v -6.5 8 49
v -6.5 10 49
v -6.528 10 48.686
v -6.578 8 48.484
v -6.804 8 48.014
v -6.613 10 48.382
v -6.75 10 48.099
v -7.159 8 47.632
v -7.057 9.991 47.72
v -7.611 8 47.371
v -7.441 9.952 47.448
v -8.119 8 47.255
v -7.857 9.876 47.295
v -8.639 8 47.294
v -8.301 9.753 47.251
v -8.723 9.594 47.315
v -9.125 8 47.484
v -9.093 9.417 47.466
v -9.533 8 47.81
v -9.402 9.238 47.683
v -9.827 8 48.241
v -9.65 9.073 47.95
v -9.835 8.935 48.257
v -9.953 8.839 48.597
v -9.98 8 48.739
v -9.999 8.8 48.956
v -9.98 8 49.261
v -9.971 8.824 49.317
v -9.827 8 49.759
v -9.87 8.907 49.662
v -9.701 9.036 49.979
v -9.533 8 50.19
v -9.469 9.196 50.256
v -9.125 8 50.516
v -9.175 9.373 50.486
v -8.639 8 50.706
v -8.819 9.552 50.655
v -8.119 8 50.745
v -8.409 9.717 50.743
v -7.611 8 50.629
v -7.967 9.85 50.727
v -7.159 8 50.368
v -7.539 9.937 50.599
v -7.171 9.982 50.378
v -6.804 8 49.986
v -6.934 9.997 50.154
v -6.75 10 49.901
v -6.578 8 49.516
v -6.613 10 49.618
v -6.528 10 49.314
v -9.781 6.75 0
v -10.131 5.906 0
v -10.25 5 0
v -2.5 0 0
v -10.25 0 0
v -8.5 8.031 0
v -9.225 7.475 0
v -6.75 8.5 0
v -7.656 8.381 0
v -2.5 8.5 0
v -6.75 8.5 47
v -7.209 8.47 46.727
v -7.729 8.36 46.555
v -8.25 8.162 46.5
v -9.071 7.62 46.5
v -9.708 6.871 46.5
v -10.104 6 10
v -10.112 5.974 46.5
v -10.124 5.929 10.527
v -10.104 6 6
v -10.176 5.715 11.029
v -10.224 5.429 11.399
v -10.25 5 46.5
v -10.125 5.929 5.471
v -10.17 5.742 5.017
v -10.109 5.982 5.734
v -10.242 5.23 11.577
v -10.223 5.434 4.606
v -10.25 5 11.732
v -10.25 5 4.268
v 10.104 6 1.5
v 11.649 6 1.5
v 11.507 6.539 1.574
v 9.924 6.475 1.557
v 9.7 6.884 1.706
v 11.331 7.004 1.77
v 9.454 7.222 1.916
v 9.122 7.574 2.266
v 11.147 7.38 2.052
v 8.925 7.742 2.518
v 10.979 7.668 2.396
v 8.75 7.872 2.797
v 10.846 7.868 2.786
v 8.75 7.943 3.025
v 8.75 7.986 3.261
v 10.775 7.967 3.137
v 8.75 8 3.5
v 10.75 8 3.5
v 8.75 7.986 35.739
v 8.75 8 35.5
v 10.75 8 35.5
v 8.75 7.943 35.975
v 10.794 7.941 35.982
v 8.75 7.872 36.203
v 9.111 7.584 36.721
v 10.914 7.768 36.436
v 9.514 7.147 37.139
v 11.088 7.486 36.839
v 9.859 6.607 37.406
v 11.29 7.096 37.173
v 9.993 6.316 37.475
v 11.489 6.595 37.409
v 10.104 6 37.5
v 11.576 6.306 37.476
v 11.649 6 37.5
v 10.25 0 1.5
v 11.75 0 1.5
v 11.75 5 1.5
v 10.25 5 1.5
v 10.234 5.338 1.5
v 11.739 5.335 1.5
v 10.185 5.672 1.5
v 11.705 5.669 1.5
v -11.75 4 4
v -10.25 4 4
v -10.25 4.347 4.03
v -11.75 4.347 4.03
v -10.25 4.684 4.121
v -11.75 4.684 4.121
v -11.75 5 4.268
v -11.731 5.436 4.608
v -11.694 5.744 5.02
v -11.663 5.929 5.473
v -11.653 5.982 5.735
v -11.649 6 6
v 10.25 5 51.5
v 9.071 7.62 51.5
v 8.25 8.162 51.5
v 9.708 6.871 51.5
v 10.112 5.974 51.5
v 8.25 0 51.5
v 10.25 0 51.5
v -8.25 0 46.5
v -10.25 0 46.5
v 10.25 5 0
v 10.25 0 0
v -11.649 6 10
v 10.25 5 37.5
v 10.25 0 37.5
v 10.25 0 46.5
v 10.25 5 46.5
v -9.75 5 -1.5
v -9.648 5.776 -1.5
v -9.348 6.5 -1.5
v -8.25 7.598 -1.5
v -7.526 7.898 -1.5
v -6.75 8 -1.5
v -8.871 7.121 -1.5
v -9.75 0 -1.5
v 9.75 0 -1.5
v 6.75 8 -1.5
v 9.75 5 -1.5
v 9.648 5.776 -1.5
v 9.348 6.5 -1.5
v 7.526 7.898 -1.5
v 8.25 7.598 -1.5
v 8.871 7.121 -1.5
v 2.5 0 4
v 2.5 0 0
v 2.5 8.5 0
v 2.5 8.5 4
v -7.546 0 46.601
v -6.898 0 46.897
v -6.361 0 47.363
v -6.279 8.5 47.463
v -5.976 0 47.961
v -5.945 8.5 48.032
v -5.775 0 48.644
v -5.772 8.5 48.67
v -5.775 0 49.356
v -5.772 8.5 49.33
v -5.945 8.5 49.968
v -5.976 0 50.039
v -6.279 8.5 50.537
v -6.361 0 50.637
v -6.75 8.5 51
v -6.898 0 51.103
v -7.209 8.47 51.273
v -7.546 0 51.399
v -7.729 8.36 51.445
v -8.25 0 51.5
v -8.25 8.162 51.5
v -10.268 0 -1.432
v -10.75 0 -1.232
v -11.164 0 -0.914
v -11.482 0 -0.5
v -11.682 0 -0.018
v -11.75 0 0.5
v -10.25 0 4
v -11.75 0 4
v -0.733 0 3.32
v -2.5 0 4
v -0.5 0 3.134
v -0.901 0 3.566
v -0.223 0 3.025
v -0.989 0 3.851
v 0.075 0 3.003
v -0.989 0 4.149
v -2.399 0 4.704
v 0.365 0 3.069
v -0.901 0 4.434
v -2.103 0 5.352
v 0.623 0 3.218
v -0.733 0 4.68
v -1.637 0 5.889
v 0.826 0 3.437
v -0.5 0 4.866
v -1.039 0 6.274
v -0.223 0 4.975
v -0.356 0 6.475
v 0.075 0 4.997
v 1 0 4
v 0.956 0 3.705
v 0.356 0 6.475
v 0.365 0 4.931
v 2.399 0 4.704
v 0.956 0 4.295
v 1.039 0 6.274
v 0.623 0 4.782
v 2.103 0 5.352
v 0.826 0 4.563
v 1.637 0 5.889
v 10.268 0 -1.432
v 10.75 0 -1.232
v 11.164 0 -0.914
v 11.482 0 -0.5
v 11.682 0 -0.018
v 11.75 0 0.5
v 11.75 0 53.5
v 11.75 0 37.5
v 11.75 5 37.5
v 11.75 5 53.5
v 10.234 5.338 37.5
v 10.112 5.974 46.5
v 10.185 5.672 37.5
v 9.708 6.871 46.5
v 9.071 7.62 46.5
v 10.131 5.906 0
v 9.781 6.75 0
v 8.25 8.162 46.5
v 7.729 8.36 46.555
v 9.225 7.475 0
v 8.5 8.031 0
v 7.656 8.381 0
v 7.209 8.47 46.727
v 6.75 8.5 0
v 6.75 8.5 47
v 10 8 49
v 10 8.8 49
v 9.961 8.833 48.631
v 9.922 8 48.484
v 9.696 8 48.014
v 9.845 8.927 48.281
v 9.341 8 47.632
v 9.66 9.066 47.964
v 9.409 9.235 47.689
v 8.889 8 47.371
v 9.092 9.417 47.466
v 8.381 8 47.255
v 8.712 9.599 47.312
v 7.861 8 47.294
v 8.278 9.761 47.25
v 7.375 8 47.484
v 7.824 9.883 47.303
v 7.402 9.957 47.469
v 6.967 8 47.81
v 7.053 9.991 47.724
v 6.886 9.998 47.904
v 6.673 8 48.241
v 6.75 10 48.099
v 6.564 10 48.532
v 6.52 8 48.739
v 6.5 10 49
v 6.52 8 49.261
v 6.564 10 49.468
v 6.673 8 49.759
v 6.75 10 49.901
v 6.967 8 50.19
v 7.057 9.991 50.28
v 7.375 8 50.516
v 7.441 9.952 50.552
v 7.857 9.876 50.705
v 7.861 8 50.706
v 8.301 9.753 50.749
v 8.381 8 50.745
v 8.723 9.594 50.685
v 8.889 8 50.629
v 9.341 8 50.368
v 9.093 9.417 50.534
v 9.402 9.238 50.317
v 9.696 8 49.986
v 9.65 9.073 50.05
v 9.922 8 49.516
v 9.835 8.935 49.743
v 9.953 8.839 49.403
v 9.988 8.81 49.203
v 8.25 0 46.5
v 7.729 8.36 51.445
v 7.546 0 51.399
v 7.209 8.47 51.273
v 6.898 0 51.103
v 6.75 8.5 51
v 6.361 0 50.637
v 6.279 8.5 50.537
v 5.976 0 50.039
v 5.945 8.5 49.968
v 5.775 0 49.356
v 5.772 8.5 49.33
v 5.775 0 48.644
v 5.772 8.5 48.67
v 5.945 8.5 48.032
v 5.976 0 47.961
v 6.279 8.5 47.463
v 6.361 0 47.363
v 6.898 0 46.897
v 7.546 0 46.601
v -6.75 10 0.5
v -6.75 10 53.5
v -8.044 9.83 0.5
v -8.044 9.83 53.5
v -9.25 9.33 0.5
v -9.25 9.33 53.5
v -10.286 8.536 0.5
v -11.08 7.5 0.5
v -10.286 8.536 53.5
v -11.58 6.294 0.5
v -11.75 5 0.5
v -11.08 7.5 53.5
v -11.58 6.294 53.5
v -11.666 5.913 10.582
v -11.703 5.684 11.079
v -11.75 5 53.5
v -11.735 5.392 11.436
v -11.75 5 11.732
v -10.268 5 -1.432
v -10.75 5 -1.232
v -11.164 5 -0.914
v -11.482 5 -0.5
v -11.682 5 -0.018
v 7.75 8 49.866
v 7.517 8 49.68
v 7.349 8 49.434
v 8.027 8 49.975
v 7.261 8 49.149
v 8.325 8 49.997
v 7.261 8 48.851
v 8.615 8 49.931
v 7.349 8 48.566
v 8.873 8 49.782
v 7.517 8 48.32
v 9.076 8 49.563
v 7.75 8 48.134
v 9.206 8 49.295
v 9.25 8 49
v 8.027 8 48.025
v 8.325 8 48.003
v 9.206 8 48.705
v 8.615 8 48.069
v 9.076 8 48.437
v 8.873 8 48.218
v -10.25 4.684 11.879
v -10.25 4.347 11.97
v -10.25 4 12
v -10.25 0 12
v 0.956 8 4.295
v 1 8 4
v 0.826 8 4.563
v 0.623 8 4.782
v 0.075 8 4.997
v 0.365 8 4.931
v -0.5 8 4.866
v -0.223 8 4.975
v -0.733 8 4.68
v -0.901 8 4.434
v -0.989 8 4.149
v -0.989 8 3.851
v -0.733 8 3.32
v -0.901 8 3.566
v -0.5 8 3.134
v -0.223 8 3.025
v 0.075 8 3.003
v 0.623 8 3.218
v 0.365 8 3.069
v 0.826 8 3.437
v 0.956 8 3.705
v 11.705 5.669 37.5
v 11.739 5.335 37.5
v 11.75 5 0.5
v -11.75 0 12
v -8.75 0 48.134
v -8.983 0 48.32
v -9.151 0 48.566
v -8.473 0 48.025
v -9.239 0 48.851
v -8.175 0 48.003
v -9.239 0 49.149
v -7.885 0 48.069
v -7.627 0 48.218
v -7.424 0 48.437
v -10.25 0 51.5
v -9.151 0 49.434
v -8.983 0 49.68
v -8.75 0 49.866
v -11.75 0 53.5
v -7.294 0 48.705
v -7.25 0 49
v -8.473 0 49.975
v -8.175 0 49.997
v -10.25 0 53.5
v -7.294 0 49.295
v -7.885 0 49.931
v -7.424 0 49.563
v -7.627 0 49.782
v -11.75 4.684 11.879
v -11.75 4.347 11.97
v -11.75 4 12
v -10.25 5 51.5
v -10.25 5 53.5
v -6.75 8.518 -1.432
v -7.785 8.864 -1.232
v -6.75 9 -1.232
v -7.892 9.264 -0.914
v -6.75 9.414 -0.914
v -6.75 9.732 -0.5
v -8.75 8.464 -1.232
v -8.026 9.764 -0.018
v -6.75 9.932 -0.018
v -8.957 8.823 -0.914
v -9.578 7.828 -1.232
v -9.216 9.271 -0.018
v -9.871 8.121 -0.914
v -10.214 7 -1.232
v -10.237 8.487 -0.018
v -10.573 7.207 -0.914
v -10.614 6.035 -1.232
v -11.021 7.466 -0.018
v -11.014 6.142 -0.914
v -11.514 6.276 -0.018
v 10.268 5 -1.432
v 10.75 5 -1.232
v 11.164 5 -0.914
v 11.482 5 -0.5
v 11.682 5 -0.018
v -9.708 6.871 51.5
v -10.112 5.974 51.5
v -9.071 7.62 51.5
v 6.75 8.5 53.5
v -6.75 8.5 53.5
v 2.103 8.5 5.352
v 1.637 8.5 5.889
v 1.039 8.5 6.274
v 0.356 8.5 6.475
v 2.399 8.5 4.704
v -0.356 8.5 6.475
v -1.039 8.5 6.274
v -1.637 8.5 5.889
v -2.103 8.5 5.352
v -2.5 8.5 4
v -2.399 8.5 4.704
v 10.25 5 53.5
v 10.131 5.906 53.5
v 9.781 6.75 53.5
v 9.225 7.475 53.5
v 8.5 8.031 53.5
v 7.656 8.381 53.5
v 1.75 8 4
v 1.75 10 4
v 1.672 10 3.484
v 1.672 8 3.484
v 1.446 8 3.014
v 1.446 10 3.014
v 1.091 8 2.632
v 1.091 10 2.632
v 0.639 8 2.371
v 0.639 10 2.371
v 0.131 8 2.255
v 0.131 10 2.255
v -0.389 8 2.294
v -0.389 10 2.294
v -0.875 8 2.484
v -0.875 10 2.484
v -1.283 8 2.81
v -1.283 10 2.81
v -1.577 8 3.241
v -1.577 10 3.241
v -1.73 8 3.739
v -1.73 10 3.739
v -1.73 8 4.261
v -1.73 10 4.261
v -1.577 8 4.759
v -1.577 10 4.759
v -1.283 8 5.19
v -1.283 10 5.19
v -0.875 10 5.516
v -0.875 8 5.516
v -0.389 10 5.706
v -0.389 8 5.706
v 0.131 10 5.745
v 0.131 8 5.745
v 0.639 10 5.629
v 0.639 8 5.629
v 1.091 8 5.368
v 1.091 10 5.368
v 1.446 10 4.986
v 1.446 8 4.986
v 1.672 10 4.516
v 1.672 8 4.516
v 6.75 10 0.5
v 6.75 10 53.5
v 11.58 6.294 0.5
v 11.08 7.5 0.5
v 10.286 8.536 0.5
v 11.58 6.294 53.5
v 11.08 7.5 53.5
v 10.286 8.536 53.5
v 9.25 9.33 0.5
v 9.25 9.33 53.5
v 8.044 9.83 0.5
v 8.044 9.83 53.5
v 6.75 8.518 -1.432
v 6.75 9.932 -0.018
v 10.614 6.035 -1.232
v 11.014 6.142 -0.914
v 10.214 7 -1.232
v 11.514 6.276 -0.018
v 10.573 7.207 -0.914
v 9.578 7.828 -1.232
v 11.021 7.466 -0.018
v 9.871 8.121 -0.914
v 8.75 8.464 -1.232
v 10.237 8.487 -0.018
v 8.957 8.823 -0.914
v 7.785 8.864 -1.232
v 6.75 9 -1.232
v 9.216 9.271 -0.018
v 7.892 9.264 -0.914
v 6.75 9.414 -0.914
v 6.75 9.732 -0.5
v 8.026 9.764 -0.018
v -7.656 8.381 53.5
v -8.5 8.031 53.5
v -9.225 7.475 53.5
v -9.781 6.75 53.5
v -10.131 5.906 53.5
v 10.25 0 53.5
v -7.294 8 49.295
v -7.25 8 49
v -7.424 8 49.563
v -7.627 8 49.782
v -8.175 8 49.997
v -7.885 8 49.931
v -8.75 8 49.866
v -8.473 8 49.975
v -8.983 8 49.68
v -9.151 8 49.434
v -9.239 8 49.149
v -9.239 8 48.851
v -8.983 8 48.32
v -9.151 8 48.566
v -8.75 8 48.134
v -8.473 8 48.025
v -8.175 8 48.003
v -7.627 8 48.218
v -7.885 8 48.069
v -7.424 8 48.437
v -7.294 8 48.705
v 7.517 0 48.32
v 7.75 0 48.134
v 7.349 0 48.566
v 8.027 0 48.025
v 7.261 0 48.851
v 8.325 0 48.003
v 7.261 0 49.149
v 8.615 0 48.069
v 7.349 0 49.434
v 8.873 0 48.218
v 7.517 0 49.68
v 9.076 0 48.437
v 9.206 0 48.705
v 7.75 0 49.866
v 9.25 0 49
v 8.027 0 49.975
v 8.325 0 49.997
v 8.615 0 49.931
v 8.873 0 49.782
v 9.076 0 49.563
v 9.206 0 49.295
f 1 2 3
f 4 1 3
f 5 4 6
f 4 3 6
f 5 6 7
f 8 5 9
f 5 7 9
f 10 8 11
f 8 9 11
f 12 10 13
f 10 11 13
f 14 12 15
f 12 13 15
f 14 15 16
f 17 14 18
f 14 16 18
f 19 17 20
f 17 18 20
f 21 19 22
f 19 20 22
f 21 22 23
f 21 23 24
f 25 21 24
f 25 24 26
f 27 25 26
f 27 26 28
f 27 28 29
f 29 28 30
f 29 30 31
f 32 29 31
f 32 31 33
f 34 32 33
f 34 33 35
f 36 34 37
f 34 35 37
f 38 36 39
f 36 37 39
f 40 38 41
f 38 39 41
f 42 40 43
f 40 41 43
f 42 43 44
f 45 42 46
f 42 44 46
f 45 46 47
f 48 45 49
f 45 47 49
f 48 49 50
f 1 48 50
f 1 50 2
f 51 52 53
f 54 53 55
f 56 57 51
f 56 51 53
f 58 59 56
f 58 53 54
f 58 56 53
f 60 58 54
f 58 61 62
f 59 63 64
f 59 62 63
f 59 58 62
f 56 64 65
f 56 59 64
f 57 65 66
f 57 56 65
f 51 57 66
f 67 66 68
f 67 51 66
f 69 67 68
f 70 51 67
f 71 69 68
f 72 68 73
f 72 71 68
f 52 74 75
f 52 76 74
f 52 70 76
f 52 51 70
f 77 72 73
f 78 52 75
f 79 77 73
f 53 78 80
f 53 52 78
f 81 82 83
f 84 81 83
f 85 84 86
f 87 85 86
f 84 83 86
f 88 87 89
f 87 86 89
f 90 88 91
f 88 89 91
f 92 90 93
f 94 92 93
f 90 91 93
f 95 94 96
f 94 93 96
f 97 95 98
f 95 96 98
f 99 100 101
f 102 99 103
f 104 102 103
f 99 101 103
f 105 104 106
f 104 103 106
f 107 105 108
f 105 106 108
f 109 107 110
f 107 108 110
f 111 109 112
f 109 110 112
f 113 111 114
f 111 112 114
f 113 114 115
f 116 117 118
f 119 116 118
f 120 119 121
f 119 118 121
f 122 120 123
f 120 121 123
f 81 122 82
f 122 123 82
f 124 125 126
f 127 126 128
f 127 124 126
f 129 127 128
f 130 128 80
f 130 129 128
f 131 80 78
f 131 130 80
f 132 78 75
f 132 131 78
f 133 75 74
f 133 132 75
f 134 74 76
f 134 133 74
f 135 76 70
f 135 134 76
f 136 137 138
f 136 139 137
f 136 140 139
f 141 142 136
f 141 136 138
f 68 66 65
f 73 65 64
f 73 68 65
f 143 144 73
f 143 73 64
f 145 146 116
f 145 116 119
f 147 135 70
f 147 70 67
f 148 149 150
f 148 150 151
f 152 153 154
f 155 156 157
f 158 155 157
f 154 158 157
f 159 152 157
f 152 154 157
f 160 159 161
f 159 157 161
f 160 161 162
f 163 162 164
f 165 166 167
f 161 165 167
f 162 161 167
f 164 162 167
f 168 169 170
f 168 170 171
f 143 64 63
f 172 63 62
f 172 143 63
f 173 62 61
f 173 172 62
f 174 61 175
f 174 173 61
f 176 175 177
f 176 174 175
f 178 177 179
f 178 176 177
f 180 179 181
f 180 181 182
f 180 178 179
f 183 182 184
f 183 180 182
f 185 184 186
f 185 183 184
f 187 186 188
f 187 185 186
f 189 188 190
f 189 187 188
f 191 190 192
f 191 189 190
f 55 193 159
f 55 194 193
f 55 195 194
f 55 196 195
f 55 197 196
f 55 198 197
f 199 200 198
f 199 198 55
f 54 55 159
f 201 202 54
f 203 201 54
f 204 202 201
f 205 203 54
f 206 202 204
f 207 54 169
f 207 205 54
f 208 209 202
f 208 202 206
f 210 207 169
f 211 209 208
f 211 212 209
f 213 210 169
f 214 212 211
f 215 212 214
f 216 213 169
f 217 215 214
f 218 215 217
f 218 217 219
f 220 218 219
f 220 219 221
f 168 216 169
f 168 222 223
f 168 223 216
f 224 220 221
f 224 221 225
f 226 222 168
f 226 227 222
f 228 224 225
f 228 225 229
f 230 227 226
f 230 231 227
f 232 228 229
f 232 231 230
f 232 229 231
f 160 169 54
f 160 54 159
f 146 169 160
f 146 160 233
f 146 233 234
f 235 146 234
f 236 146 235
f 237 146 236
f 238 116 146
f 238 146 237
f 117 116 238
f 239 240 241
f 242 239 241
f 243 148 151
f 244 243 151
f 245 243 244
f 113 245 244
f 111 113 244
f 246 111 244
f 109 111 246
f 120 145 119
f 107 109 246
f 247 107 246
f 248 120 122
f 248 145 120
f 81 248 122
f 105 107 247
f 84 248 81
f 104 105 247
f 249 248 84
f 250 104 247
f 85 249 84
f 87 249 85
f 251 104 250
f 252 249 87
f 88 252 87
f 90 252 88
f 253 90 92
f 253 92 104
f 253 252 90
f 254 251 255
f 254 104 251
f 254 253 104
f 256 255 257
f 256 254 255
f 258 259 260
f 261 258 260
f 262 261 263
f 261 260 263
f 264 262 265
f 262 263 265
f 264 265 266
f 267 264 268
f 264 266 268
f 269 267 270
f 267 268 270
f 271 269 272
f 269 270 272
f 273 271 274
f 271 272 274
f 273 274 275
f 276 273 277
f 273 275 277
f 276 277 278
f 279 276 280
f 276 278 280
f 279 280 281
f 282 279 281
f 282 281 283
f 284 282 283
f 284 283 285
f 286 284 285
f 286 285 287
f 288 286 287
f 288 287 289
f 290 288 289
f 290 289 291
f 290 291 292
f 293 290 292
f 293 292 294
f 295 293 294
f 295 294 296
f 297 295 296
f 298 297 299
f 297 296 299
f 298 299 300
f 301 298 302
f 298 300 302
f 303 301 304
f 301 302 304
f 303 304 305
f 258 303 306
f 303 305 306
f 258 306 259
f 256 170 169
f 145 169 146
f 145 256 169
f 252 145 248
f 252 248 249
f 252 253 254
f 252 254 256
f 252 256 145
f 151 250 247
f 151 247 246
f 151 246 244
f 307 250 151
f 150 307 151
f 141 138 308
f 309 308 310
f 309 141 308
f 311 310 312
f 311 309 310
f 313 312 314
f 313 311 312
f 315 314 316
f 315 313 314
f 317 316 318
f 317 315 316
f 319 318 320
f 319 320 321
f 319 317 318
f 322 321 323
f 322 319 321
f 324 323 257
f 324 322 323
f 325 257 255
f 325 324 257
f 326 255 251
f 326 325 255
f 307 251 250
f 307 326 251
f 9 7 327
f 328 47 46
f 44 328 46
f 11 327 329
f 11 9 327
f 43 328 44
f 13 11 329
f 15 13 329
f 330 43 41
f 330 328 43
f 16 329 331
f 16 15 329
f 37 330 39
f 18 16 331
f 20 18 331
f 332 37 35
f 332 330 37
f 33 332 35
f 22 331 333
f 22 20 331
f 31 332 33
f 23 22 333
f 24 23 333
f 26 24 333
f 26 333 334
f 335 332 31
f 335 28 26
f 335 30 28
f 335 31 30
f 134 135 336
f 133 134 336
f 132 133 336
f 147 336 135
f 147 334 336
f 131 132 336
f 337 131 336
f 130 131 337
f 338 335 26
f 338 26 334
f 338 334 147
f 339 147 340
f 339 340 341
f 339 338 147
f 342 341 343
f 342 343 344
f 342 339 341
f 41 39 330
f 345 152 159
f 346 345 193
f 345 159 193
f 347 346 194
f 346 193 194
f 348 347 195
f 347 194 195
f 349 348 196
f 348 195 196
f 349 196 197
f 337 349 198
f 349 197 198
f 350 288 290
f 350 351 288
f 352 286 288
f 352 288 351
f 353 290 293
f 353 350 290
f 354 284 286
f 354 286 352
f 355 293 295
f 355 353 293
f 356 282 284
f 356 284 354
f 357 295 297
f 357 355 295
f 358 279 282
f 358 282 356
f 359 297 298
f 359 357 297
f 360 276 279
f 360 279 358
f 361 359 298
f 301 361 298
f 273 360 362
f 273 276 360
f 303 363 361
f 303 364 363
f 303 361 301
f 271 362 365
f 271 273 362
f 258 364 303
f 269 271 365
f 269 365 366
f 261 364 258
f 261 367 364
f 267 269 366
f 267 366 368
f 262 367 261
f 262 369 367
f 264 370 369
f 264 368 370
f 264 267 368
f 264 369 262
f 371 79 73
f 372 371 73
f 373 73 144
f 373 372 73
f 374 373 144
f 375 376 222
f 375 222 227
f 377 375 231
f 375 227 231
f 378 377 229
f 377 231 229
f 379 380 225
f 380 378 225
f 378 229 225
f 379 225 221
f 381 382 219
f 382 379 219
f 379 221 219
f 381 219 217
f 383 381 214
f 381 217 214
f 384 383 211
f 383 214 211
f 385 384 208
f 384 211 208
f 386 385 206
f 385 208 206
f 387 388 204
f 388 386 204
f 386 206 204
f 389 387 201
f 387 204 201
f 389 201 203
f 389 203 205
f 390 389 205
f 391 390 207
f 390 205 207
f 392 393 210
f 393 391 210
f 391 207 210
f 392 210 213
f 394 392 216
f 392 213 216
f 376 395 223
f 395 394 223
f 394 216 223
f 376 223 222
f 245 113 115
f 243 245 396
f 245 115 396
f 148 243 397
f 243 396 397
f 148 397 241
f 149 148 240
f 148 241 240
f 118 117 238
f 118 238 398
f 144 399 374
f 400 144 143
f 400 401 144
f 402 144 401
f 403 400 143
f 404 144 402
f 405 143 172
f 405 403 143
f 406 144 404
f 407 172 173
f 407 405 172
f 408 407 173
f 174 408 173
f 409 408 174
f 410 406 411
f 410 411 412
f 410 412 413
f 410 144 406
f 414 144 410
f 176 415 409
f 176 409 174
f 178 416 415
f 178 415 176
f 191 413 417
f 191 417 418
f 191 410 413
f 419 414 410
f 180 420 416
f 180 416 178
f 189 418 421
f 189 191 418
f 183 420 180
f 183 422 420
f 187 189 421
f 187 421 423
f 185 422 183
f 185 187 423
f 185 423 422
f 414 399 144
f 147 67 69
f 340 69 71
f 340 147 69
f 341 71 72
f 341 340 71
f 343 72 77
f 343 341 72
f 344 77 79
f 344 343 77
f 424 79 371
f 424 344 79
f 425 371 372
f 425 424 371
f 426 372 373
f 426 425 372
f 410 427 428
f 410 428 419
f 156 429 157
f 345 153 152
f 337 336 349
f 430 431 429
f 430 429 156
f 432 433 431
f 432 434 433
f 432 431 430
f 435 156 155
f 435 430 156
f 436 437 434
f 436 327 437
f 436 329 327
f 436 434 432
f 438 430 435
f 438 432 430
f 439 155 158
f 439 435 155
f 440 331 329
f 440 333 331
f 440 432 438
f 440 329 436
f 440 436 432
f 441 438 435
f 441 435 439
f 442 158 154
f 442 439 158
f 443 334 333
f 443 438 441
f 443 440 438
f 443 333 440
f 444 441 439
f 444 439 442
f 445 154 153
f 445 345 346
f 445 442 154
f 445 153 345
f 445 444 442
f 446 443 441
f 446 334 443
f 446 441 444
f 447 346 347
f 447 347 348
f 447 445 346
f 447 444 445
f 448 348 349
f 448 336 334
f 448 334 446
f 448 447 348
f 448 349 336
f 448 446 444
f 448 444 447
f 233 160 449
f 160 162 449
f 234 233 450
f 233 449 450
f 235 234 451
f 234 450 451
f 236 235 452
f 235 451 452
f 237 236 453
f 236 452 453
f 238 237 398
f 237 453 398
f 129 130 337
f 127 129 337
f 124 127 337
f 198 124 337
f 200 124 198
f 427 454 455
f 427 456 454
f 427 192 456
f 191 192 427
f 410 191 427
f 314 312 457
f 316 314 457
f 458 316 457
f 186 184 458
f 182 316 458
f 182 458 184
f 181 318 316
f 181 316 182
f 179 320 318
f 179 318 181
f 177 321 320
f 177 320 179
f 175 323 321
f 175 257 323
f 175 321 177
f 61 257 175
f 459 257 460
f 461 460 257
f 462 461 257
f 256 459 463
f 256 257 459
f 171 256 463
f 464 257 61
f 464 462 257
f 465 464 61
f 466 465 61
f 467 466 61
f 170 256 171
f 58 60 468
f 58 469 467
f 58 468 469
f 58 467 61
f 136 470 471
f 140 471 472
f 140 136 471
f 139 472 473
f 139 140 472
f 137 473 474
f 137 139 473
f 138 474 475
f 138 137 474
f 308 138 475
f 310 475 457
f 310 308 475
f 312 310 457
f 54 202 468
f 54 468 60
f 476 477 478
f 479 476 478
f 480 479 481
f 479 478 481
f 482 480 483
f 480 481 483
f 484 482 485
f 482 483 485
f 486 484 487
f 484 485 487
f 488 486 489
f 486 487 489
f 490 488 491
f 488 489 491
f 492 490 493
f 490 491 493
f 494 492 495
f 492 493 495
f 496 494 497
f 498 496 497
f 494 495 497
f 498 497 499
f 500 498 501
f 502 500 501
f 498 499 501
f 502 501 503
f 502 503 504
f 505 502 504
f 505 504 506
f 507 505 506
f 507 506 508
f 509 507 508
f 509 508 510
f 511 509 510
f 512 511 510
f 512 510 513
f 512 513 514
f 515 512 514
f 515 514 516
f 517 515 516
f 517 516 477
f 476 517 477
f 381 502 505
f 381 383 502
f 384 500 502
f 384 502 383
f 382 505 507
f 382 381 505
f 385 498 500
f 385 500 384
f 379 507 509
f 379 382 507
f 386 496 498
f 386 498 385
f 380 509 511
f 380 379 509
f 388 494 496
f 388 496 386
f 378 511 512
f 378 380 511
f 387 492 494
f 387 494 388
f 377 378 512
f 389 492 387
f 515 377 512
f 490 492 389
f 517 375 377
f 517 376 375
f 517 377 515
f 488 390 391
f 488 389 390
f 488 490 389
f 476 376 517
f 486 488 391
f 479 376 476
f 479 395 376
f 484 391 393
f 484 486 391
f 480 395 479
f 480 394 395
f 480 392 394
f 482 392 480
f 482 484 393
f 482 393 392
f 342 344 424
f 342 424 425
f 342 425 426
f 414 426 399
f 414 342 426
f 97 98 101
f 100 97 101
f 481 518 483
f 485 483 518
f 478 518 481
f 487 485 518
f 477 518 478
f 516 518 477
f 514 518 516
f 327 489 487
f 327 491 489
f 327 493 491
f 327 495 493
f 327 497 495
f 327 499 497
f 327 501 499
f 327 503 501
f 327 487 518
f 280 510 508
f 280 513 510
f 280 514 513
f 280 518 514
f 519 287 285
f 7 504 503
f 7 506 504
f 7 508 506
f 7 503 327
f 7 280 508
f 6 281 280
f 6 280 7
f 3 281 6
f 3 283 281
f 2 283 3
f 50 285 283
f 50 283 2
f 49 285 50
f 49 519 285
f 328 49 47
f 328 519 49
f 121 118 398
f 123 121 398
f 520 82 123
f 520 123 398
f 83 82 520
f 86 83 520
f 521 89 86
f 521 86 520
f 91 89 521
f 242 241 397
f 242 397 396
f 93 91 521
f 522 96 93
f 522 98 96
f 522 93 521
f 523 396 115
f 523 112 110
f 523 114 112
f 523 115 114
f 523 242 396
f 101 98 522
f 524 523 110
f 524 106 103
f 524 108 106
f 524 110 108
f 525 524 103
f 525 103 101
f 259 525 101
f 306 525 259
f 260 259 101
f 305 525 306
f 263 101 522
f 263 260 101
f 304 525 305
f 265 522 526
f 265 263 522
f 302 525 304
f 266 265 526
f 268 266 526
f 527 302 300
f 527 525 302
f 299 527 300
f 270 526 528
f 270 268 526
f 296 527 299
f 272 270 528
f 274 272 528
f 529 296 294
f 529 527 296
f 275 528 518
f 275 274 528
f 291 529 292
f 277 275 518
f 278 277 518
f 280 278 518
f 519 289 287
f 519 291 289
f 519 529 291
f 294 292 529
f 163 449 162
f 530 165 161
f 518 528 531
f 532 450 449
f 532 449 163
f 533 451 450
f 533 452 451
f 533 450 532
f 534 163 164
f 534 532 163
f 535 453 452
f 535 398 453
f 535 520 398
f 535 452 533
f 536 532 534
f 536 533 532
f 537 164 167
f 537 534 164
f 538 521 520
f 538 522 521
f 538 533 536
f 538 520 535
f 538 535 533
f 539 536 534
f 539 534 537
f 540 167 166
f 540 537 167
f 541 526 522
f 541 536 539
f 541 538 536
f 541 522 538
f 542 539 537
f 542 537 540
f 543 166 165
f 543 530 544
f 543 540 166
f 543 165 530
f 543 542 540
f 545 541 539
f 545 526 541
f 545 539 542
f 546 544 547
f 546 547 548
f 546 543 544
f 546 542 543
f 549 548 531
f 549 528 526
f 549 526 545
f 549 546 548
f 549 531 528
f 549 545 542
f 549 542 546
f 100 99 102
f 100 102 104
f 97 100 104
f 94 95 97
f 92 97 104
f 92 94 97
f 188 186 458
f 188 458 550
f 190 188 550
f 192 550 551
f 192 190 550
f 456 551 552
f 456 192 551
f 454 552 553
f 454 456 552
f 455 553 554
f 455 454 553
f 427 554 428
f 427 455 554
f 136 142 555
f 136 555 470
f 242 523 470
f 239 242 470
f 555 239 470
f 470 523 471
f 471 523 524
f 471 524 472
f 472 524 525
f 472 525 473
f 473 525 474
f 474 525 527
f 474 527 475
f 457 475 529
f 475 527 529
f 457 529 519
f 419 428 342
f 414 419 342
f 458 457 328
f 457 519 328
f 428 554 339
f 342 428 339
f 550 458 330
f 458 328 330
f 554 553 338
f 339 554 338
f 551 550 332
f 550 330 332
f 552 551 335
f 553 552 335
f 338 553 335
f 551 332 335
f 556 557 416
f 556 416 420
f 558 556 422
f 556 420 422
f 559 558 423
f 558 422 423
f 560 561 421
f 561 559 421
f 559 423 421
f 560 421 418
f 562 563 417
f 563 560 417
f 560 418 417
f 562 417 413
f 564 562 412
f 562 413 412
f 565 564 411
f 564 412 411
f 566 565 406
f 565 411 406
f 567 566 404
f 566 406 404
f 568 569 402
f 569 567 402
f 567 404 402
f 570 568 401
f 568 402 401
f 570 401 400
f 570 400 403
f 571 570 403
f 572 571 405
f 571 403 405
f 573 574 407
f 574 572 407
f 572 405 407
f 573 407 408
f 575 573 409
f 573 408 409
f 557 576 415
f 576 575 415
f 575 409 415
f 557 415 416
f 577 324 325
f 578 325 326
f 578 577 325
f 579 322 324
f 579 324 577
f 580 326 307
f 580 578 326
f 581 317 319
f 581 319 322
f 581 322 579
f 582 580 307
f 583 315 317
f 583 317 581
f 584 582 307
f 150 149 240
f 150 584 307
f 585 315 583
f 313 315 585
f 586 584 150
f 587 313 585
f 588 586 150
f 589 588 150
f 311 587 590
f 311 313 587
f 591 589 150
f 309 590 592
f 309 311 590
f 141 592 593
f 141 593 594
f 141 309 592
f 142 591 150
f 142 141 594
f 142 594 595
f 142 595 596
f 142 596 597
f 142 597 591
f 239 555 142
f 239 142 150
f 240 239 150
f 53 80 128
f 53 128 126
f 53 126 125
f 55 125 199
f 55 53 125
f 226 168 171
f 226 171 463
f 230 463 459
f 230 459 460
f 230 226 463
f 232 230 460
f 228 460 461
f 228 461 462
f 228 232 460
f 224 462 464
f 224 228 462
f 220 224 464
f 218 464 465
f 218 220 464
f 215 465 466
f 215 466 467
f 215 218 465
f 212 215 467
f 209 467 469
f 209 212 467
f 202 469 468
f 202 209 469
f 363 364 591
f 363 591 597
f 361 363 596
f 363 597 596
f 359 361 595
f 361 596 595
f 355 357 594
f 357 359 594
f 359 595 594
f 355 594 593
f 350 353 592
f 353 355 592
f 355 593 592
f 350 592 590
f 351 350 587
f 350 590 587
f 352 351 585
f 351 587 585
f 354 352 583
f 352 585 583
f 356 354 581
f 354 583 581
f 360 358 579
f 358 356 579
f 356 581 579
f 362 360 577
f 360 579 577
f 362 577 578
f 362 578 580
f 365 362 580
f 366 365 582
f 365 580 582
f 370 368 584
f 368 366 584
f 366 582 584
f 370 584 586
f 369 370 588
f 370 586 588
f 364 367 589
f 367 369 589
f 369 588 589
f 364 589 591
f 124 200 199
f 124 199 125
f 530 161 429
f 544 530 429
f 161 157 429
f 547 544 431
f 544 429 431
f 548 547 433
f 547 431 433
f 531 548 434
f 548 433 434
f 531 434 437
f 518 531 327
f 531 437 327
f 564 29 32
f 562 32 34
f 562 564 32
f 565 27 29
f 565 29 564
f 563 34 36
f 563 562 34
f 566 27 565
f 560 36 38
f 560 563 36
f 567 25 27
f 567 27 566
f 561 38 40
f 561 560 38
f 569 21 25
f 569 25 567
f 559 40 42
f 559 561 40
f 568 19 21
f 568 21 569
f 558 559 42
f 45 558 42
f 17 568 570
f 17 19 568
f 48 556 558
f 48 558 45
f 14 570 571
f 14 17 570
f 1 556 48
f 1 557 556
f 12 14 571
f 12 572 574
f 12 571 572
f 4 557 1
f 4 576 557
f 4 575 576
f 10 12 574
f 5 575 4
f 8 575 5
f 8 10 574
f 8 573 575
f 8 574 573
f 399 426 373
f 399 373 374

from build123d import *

# Parameters (mm, degrees)
BOSS_EXTRUDE1_DEPTH = 53.5
BOSS_EXTRUDE2_DEPTH = 1.5
CUT_EXTRUDE1_DEPTH  = 3
BOSS_EXTRUDE3_DEPTH = 8.5
SKETCH5_R           = 1
CUT_EXTRUDE2_DEPTH  = 10
HOLE1_D             = 2
HOLE1_CBORE_D       = 3.5
HOLE1_CBORE_DEPTH   = 2
CUT_EXTRUDE4_DEPTH  = 3
FILLET1_R           = 2


with BuildPart() as part:
    # Sketch1 → Boss-Extrude1 (new body)
    with BuildSketch(Plane.XY):
        with BuildLine():
            Line((10.25, 0), (10.25, 5))
            ThreePointArc((10.25, 5), (9.224873734, 7.474873734), (6.75, 8.5))
            Line((6.75, 8.5), (-6.75, 8.5))
            ThreePointArc((-6.75, 8.5), (-9.224873734, 7.474873734), (-10.25, 5))
            Line((-10.25, 5), (-10.25, 0))
            Line((-10.25, 0), (-11.75, 0))
            Line((-11.75, 0), (-11.75, 5))
            ThreePointArc((-11.75, 5), (-10.285533906, 8.535533906), (-6.75, 10))
            Line((-6.75, 10), (6.75, 10))
            ThreePointArc((6.75, 10), (10.285533906, 8.535533906), (11.75, 5))
            Line((11.75, 5), (11.75, 0))
            Line((11.75, 0), (10.25, 0))
        make_face()
    extrude(amount=BOSS_EXTRUDE1_DEPTH)

    # Sketch2 → Boss-Extrude2 (add)
    with BuildSketch(Plane.XY):
        with BuildLine():
            Line((-11.75, 0), (11.75, 0))
            Line((11.75, 0), (11.75, 5))
            ThreePointArc((11.75, 5), (10.285533906, 8.535533906), (6.75, 10))
            Line((6.75, 10), (-6.75, 10))
            ThreePointArc((-6.75, 10), (-10.285533906, 8.535533906), (-11.75, 5))
            Line((-11.75, 5), (-11.75, 0))
        make_face()
    extrude(amount=-BOSS_EXTRUDE2_DEPTH)

    # Sketch3 → Cut-Extrude1 (cut)
    with BuildSketch(Plane(origin=(11.75, 0, 0), x_dir=(0, 0, -1), z_dir=(1, 0, 0))):
        with BuildLine():
            Line((-8, 0), (-1.5, 0))
            Line((-1.5, 0), (-1.5, 6))
            ThreePointArc((-1.5, 6), (-2.085786438, 7.414213562), (-3.5, 8))
            Line((-3.5, 8), (-35.5, 8))
            ThreePointArc((-35.5, 8), (-36.914213562, 7.414213562), (-37.5, 6))
            Line((-37.5, 6), (-37.5, 0))
            Line((-37.5, 0), (-8, 0))
        make_face()
    extrude(amount=-CUT_EXTRUDE1_DEPTH, mode=Mode.SUBTRACT)

    # Sketch4 → Boss-Extrude3 (add)
    with BuildSketch(Plane.XZ):
        with BuildLine():
            Line((2.5, 0), (2.5, 4))
            ThreePointArc((2.5, 4), (0, 6.5), (-2.5, 4))
            Line((-2.5, 4), (-2.5, 0))
            Line((-2.5, 0), (2.5, 0))
        make_face()
        with BuildLine():
            Line((10.25, 51.5), (8.25, 51.5))
            ThreePointArc((8.25, 51.5), (5.75, 49), (8.25, 46.5))
            Line((8.25, 46.5), (10.25, 46.5))
            Line((10.25, 46.5), (10.25, 51.5))
        make_face()
        with BuildLine():
            Line((-10.25, 51.5), (-10.25, 46.5))
            Line((-10.25, 46.5), (-8.25, 46.5))
            ThreePointArc((-8.25, 46.5), (-5.75, 49), (-8.25, 51.5))
            Line((-8.25, 51.5), (-10.25, 51.5))
        make_face()
    extrude(amount=-BOSS_EXTRUDE3_DEPTH)

    # Sketch5 → Cut-Extrude2 (cut)
    with BuildSketch(Plane.XZ):
        with Locations((0, 4)):
            Circle(SKETCH5_R)
        with Locations((8.25, 49)):
            Circle(SKETCH5_R)
        with Locations((-8.25, 49)):
            Circle(SKETCH5_R)
    extrude(amount=-CUT_EXTRUDE2_DEPTH, mode=Mode.SUBTRACT)

    # Hole1 (through all)
    with Locations(Plane(origin=(0, 10, 0), x_dir=(1, 0, 0), z_dir=(0, 1, 0))):
        with Locations((0, -4), (-8.25, -49), (8.25, -49)):
            CounterBoreHole(HOLE1_D / 2, HOLE1_CBORE_D / 2, HOLE1_CBORE_DEPTH)

    # Sketch10 → Cut-Extrude4 (cut)
    with BuildSketch(Plane.ZY.offset(11.75)):
        with BuildLine():
            Line((4, 0), (4, 4))
            ThreePointArc((4, 4), (4.585786438, 5.414213562), (6, 6))
            Line((6, 6), (10, 6))
            ThreePointArc((10, 6), (11.414213562, 5.414213562), (12, 4))
            Line((12, 4), (12, 0))
            Line((12, 0), (4, 0))
        make_face()
    extrude(amount=-CUT_EXTRUDE4_DEPTH, mode=Mode.SUBTRACT)

    # Fillet1
    fillet1_edges = [part.edges().sort_by_distance(p)[0] for p in [
        (-11.75, 2.5, -1.5),
        (-10.285533906, 8.535533906, -1.5),
        (0, 10, -1.5),
        (10.285533906, 8.535533906, -1.5),
        (11.75, 2.5, -1.5),
    ]]
    fillet(fillet1_edges, radius=FILLET1_R)


solid = part.part
